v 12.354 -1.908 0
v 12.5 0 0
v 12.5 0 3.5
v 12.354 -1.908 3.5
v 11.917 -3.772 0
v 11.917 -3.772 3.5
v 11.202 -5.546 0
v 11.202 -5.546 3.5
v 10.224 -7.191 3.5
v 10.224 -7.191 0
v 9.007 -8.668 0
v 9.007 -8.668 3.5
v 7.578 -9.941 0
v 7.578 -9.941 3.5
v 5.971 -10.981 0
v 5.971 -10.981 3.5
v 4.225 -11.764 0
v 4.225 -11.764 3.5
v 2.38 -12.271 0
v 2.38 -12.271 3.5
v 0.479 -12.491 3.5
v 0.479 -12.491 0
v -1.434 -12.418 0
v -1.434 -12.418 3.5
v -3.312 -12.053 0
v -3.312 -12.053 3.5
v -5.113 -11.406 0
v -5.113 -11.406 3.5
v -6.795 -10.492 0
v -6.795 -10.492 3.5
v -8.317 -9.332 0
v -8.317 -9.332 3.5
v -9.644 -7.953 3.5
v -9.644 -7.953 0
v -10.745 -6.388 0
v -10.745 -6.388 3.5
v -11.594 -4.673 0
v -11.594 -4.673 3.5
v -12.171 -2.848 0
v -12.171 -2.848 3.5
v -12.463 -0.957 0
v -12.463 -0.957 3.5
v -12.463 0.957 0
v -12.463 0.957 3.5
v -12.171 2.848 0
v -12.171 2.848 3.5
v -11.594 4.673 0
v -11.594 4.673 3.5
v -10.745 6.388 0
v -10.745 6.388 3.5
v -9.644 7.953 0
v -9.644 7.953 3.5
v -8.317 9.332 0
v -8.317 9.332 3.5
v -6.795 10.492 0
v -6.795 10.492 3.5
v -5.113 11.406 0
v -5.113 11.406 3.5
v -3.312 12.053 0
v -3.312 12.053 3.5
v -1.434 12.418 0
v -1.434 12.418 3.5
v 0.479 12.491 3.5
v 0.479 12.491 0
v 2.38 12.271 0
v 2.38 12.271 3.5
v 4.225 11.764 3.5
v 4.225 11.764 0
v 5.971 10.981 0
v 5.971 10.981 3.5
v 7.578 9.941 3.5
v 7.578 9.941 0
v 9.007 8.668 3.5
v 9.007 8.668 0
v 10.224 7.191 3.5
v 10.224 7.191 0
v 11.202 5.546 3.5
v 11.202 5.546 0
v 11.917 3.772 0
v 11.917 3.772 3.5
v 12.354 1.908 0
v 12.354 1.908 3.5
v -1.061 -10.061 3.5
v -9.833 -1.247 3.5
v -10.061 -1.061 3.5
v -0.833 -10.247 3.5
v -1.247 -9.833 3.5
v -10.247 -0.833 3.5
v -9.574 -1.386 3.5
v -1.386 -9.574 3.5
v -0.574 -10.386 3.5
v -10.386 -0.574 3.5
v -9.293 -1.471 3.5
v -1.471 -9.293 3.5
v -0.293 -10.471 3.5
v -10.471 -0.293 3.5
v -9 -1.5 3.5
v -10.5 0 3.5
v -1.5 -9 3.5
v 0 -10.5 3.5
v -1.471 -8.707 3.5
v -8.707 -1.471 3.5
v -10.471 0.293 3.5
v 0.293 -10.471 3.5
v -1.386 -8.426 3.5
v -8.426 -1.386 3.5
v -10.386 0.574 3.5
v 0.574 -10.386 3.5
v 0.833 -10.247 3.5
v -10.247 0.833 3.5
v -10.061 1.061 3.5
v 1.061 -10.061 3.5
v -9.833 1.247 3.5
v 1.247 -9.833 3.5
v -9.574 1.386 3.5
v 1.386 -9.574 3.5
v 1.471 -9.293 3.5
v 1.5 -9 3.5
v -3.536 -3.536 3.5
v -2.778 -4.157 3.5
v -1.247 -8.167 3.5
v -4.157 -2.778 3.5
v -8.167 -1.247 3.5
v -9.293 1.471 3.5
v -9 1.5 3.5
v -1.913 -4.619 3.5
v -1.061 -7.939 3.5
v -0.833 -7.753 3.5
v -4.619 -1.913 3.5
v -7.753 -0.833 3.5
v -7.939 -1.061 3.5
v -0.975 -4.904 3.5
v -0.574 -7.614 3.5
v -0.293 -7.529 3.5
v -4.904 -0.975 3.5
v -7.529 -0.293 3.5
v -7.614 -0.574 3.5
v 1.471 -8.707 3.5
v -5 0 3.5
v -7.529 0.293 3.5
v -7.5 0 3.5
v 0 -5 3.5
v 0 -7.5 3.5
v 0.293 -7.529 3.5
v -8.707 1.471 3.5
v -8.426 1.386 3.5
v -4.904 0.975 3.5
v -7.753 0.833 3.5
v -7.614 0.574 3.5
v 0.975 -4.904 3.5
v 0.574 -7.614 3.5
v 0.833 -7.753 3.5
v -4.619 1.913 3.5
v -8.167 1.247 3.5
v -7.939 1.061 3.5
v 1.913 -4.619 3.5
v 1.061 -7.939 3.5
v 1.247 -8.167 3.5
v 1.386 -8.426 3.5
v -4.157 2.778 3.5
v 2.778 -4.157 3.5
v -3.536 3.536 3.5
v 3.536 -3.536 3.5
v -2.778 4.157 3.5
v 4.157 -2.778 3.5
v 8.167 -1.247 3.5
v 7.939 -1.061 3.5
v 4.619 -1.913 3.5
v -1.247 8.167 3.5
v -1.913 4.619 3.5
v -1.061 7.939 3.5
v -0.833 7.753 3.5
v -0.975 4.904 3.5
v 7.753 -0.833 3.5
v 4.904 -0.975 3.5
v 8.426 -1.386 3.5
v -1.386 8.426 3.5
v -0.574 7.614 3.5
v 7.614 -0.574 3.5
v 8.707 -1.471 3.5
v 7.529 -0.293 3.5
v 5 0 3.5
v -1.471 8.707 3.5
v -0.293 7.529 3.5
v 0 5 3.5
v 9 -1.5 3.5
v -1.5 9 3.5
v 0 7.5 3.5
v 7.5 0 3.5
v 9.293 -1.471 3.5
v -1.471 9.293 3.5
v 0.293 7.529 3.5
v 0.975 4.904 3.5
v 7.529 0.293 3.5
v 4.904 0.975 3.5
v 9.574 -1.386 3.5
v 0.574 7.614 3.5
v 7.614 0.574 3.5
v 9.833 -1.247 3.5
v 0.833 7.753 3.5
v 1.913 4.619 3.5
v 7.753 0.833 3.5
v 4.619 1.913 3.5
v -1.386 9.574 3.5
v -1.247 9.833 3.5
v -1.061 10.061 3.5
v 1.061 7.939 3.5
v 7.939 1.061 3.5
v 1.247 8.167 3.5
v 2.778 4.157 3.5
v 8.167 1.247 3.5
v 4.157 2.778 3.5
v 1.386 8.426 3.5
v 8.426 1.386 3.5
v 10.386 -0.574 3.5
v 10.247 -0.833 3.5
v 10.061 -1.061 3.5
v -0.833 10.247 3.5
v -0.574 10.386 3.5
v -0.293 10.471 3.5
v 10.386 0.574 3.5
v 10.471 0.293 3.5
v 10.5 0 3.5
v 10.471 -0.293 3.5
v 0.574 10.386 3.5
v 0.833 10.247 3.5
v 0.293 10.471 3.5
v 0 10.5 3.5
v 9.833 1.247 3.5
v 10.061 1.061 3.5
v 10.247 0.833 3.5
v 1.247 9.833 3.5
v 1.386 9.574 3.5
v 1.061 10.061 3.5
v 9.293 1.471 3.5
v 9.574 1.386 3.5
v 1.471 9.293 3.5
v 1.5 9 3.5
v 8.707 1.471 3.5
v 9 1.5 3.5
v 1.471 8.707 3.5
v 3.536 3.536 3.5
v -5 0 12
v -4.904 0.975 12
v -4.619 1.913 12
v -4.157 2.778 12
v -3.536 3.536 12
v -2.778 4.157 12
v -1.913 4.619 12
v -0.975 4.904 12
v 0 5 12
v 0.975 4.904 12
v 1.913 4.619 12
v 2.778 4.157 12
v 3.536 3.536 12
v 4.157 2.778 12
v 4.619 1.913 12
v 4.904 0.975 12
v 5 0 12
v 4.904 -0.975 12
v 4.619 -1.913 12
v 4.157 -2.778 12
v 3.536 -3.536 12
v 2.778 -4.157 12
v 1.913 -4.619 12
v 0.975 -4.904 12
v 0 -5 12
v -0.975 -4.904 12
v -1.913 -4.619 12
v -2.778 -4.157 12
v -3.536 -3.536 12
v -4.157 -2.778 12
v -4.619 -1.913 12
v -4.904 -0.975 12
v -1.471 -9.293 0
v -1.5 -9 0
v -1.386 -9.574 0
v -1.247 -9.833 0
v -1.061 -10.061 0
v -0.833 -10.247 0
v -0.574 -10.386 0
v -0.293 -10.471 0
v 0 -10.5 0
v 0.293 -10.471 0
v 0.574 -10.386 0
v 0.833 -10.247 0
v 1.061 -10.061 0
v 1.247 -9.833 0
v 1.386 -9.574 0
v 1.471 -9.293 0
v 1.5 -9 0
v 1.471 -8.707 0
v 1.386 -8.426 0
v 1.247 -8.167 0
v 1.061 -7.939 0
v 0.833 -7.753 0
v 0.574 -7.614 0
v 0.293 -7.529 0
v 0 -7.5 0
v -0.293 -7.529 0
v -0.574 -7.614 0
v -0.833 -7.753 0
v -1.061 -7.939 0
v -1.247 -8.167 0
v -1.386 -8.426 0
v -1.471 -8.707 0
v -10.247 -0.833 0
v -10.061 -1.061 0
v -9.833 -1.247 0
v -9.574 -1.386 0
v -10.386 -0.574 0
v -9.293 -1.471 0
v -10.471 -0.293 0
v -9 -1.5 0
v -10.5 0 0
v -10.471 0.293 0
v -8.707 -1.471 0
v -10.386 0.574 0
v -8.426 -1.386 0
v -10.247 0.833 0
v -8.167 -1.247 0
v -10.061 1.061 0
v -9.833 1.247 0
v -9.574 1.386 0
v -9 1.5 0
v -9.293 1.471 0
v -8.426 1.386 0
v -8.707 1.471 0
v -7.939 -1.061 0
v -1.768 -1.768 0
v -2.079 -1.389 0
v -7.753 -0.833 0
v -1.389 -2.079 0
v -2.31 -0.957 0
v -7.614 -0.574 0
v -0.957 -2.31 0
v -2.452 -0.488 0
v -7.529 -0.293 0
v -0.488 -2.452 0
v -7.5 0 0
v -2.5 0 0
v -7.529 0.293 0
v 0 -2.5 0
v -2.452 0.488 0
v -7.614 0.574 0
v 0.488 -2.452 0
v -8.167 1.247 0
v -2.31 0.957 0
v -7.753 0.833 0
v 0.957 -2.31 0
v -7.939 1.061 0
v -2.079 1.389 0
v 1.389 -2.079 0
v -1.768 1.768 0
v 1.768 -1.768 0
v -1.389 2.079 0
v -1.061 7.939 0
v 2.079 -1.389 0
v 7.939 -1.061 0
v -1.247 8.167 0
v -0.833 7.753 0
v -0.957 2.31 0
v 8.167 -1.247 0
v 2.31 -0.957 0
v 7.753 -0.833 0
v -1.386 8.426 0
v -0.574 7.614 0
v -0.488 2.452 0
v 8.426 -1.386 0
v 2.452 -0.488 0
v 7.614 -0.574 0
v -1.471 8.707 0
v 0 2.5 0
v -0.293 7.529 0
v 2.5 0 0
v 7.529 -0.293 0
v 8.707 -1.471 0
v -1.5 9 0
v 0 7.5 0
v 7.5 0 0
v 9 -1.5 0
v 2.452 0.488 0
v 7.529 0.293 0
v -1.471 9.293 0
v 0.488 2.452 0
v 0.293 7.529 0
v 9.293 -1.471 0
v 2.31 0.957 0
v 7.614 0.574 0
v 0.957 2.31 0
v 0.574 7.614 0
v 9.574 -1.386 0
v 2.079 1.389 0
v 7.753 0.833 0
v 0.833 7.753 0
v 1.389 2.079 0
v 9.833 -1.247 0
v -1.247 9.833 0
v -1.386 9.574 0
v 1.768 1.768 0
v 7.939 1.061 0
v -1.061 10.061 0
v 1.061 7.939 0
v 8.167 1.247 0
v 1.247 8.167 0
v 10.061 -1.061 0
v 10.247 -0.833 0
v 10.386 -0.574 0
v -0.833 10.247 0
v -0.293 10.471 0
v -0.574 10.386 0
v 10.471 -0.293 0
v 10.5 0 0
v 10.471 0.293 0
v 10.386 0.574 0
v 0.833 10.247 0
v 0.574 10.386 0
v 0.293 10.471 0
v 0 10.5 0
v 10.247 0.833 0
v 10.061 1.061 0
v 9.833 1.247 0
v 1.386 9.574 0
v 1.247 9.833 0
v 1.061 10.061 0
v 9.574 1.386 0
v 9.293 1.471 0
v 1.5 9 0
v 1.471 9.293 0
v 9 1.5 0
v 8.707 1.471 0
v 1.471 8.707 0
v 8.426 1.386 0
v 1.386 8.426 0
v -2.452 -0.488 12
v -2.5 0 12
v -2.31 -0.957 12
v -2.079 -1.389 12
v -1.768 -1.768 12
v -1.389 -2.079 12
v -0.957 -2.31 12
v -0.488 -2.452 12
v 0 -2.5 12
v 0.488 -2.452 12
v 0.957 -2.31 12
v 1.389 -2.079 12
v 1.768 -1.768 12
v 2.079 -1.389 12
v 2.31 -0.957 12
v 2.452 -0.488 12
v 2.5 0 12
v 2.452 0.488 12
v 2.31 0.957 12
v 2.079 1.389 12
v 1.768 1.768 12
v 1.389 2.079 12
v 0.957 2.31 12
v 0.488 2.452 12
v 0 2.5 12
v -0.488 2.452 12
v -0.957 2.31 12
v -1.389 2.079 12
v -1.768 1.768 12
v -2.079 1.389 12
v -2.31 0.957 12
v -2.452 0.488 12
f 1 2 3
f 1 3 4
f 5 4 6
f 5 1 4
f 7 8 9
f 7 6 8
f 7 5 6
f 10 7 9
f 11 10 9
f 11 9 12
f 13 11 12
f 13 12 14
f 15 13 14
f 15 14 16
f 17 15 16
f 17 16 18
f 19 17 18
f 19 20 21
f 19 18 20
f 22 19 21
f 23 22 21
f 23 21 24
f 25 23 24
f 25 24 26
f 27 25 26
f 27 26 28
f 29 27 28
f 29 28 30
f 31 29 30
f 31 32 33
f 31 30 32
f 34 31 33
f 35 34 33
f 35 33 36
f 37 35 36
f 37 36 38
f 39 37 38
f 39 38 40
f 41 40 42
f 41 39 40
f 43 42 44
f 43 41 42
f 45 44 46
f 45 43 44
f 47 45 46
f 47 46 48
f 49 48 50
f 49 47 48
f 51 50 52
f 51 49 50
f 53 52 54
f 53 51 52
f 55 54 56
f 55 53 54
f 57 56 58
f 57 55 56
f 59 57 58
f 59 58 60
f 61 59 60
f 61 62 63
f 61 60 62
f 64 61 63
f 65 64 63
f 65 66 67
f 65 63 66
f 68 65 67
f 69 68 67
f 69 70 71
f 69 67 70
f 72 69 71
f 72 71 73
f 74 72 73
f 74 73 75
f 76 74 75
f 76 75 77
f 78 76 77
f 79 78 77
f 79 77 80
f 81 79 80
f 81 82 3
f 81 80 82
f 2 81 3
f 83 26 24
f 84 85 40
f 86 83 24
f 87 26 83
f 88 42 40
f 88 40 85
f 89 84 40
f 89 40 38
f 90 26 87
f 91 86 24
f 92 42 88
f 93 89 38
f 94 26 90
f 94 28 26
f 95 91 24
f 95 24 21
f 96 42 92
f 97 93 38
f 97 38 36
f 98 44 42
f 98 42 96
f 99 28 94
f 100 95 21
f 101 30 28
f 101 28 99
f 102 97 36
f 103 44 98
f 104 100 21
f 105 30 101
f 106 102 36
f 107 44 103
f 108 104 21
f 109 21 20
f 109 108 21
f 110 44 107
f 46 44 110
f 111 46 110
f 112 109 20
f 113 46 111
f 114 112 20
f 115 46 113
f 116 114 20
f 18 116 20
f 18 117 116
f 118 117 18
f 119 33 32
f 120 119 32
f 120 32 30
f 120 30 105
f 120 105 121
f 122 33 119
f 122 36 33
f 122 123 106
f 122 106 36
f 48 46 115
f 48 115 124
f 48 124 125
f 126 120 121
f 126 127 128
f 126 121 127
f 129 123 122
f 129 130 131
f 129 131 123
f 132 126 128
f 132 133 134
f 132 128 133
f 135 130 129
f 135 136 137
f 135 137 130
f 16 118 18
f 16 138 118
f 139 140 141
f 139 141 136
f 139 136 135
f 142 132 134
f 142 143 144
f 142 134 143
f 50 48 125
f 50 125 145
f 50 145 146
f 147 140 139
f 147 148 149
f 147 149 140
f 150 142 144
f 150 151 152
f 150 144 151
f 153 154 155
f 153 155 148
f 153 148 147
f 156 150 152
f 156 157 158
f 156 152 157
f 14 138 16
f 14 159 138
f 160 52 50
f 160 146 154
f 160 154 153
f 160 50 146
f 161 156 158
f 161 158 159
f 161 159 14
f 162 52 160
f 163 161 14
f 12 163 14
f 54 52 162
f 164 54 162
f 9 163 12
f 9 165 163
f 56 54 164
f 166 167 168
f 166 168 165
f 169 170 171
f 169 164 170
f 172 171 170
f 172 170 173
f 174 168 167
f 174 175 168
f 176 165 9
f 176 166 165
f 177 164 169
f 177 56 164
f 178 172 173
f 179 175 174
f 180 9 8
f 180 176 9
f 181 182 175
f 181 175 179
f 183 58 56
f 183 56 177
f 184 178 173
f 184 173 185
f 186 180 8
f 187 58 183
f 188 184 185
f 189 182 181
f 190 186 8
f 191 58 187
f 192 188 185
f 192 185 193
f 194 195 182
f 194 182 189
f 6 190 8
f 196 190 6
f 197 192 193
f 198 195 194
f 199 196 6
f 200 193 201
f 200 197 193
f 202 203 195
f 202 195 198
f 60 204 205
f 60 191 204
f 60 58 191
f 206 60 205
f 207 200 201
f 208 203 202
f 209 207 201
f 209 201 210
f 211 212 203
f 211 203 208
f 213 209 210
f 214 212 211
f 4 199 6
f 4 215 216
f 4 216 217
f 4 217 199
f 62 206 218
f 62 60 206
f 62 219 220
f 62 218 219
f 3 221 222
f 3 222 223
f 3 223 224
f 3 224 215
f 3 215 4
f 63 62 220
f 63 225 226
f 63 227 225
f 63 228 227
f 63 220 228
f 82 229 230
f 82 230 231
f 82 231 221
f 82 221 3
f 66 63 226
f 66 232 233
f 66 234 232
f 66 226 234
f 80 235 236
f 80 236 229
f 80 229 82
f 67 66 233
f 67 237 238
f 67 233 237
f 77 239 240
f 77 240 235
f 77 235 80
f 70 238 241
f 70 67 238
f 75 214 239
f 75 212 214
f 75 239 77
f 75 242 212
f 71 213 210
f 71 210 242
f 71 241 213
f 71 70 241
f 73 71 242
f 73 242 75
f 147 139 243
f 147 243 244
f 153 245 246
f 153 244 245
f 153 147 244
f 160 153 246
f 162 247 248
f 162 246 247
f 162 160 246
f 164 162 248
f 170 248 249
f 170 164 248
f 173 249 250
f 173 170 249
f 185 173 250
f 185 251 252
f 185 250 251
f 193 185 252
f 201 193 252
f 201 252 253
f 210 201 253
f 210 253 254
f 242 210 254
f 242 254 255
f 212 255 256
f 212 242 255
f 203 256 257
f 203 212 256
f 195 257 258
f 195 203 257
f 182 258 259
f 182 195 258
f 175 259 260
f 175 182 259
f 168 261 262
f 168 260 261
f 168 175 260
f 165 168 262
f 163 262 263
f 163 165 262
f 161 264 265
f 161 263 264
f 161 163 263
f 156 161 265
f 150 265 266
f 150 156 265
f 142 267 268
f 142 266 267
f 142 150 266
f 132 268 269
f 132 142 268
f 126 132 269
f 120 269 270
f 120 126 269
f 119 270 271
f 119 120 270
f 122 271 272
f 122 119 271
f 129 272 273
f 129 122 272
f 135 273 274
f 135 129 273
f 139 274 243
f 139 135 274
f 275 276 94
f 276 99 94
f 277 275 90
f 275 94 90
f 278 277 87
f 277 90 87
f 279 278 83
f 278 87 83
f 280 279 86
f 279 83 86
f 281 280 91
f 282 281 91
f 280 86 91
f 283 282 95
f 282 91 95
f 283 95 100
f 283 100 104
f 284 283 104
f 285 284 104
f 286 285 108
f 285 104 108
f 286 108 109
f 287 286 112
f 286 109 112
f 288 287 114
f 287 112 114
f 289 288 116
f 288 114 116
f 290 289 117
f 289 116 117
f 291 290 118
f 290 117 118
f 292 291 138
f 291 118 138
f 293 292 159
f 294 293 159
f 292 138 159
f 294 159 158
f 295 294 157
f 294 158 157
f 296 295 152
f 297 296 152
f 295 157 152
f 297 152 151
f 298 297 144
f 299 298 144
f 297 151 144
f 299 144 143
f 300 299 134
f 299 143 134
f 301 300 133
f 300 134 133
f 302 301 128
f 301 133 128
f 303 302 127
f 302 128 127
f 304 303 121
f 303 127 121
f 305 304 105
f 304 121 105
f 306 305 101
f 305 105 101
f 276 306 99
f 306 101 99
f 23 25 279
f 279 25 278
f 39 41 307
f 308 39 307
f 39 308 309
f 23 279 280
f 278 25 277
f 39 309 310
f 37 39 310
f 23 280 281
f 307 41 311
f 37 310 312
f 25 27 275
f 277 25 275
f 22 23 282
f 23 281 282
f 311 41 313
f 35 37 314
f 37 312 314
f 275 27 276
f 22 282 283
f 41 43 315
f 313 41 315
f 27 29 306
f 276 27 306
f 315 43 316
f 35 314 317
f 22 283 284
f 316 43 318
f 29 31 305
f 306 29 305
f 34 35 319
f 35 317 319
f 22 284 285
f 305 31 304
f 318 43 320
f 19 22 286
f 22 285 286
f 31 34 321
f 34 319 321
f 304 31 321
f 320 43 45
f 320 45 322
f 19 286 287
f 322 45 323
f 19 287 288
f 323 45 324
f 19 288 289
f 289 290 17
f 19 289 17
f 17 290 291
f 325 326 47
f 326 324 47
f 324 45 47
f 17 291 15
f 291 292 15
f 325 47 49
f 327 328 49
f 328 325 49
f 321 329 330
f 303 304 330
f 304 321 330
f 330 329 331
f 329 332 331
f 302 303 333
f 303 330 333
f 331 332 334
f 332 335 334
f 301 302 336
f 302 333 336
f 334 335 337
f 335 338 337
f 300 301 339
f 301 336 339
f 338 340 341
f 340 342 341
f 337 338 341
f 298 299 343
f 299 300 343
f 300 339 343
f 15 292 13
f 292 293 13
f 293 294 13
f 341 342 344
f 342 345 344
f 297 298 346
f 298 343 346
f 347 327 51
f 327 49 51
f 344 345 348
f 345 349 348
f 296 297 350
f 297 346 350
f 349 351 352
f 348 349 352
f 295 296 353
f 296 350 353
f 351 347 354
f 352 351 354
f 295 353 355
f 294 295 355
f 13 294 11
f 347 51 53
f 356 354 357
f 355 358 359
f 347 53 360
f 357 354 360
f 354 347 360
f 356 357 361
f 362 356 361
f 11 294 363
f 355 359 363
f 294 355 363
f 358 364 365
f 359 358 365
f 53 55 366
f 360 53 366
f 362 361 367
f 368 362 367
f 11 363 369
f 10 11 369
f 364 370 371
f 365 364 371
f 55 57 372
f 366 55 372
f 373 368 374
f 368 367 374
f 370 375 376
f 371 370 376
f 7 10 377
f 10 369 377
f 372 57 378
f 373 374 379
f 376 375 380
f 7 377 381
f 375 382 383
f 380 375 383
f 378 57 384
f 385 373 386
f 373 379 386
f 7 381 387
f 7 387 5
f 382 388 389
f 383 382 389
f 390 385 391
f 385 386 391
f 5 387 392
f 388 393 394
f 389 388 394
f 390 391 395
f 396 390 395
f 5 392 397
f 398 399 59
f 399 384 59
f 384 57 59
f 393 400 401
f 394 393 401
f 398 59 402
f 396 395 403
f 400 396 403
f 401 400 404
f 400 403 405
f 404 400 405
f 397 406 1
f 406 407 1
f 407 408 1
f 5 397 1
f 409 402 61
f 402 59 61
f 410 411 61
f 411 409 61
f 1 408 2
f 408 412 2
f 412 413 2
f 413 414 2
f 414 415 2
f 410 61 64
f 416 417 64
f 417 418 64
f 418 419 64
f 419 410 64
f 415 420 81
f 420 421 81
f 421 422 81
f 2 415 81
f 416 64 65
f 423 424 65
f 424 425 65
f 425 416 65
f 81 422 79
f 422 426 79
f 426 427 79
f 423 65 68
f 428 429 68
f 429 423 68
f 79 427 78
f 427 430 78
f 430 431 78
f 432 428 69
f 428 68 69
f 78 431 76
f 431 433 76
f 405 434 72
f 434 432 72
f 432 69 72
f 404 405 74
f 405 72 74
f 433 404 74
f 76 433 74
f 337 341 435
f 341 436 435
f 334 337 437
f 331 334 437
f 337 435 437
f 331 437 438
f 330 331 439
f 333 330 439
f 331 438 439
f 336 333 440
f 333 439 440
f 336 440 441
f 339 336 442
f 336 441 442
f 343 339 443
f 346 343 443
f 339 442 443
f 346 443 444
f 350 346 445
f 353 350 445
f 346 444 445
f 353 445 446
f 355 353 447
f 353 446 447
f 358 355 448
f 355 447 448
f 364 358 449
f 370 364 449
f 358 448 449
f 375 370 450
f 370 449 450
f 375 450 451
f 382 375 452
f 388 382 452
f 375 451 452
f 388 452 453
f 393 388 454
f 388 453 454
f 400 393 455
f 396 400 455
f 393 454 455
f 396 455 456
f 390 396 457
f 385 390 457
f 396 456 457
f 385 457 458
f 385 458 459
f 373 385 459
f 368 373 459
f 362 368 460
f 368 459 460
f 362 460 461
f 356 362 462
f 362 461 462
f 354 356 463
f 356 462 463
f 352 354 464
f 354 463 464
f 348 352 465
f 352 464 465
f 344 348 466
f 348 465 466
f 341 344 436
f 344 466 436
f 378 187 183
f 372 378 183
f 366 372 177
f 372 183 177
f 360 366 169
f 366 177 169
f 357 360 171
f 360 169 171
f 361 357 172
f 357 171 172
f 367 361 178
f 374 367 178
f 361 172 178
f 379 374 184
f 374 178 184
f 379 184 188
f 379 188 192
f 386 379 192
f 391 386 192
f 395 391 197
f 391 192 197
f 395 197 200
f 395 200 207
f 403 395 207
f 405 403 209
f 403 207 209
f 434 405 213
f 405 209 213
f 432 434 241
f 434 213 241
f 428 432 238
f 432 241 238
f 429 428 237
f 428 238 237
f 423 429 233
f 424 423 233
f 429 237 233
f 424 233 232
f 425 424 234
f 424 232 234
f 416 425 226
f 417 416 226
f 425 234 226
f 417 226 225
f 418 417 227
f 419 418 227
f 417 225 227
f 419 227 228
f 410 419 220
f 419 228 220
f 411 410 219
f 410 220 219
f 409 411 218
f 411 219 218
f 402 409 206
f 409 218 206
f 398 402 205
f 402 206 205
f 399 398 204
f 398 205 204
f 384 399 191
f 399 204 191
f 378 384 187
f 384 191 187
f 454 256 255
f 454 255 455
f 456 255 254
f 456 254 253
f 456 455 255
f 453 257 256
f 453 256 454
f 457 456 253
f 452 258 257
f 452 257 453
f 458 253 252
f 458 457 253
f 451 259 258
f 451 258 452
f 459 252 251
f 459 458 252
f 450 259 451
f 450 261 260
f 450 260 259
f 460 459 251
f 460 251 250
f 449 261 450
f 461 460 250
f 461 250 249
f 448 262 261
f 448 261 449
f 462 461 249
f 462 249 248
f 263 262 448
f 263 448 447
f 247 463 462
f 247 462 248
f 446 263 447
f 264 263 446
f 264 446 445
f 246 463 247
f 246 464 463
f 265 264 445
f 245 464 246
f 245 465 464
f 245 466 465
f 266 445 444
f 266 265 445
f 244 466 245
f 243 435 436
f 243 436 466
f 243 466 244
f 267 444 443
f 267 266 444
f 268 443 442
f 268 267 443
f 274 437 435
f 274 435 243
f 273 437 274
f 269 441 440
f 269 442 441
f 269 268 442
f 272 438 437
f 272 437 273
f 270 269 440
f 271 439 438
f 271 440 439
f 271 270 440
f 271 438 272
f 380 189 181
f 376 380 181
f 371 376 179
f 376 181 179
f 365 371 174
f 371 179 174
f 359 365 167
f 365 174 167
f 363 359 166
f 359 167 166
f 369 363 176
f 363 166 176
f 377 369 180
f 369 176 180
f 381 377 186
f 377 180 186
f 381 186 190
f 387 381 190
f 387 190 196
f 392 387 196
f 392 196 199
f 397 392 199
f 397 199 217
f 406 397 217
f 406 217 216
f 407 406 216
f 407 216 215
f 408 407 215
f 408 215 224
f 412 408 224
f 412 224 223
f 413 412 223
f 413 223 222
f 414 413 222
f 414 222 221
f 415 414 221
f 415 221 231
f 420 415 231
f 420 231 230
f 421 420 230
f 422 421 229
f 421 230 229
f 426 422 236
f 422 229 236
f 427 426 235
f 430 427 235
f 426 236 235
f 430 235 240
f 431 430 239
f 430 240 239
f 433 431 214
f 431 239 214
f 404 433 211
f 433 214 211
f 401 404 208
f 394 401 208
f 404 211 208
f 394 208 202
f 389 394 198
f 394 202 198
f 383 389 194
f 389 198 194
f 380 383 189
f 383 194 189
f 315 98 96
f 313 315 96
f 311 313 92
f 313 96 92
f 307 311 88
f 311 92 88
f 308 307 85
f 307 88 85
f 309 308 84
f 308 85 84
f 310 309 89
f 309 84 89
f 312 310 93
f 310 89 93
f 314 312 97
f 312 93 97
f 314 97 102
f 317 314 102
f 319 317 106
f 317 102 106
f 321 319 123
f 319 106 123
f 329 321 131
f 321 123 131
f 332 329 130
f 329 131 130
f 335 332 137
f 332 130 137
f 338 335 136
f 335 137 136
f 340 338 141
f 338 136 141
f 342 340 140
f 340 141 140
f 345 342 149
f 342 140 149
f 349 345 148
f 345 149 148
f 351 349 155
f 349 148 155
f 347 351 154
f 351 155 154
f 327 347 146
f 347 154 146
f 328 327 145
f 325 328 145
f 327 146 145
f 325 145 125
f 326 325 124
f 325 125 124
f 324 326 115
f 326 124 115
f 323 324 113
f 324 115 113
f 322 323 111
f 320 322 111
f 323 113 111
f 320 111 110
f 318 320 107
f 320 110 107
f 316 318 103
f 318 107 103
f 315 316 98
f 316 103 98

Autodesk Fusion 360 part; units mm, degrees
sketch "スケッチ1" plane through (0, 0, 0) normal (0, 0, 1) x (1, 0, 0)
  circle A0 centre (0, 0) radius 12.5
  dimension "d1" = 25
extrude "押し出し1" add sketch "スケッチ1" along normal blind 3.5
sketch "スケッチ2" plane through (0, 0, 3.5) normal (0, 0, 1) x (-1, 0, 0)
  circle A0 centre (0, 0) radius 12.5
  circle A1 centre (0, 0) radius 5
  dimension "d4" = 10
extrude "押し出し2" add sketch "スケッチ2" along normal blind 8.5 contours A1
sketch "スケッチ3" plane through (0, 0, 12) normal (0, 0, 1) x (-1, 0, 0)
  circle A0 centre (0, 0) radius 5
  circle A1 centre (0, 0) radius 2.5
  dimension "d7" = 5
extrude "押し出し3" cut sketch "スケッチ3" against normal blind 12 contours A1
sketch "スケッチ4" plane through (0, 0, 3.5) normal (0, 0, 1) x (-1, 0, 0)
  circle A0 centre (0, 0) radius 5
  circle A1 centre (0, 0) radius 12.5
  line L0 (12.5, 0) -> (-12.5, 0)
  line L1 (0, 0) -> (-9, 0)
  line L2 (0, 0) -> (9, 0)
  circle A2 centre (-9, 0) radius 1.5
  circle A3 centre (0, -9) radius 1.5
  circle A4 centre (9, 0) radius 1.5
  circle A5 centre (0, 9) radius 1.5
  dimension "d10" = 25
  dimension "d11" = 9
  dimension "d12" = 9
  dimension "d13" = 3
  dimension "d15" = 360
extrude "押し出し4" cut sketch "スケッチ4" against normal blind 3.5 contours L0 L2 A4 | L0 L2 A4 | L0 L1 A2 | L0 L1 A2 | A3 | A5
sketch "スケッチ5" plane through (0, 0, 3.5) normal (0, 0, 1) x (-1, 0, 0)
  circle A0 centre (0, 9) radius 1.5
  circle A1 centre (9, 0) radius 1.5
  circle A2 centre (-9, 0) radius 1.5
  circle A3 centre (0, -9) radius 1.5
  circle A4 centre (0, 0) radius 5
  circle A5 centre (0, 0) radius 12.5
